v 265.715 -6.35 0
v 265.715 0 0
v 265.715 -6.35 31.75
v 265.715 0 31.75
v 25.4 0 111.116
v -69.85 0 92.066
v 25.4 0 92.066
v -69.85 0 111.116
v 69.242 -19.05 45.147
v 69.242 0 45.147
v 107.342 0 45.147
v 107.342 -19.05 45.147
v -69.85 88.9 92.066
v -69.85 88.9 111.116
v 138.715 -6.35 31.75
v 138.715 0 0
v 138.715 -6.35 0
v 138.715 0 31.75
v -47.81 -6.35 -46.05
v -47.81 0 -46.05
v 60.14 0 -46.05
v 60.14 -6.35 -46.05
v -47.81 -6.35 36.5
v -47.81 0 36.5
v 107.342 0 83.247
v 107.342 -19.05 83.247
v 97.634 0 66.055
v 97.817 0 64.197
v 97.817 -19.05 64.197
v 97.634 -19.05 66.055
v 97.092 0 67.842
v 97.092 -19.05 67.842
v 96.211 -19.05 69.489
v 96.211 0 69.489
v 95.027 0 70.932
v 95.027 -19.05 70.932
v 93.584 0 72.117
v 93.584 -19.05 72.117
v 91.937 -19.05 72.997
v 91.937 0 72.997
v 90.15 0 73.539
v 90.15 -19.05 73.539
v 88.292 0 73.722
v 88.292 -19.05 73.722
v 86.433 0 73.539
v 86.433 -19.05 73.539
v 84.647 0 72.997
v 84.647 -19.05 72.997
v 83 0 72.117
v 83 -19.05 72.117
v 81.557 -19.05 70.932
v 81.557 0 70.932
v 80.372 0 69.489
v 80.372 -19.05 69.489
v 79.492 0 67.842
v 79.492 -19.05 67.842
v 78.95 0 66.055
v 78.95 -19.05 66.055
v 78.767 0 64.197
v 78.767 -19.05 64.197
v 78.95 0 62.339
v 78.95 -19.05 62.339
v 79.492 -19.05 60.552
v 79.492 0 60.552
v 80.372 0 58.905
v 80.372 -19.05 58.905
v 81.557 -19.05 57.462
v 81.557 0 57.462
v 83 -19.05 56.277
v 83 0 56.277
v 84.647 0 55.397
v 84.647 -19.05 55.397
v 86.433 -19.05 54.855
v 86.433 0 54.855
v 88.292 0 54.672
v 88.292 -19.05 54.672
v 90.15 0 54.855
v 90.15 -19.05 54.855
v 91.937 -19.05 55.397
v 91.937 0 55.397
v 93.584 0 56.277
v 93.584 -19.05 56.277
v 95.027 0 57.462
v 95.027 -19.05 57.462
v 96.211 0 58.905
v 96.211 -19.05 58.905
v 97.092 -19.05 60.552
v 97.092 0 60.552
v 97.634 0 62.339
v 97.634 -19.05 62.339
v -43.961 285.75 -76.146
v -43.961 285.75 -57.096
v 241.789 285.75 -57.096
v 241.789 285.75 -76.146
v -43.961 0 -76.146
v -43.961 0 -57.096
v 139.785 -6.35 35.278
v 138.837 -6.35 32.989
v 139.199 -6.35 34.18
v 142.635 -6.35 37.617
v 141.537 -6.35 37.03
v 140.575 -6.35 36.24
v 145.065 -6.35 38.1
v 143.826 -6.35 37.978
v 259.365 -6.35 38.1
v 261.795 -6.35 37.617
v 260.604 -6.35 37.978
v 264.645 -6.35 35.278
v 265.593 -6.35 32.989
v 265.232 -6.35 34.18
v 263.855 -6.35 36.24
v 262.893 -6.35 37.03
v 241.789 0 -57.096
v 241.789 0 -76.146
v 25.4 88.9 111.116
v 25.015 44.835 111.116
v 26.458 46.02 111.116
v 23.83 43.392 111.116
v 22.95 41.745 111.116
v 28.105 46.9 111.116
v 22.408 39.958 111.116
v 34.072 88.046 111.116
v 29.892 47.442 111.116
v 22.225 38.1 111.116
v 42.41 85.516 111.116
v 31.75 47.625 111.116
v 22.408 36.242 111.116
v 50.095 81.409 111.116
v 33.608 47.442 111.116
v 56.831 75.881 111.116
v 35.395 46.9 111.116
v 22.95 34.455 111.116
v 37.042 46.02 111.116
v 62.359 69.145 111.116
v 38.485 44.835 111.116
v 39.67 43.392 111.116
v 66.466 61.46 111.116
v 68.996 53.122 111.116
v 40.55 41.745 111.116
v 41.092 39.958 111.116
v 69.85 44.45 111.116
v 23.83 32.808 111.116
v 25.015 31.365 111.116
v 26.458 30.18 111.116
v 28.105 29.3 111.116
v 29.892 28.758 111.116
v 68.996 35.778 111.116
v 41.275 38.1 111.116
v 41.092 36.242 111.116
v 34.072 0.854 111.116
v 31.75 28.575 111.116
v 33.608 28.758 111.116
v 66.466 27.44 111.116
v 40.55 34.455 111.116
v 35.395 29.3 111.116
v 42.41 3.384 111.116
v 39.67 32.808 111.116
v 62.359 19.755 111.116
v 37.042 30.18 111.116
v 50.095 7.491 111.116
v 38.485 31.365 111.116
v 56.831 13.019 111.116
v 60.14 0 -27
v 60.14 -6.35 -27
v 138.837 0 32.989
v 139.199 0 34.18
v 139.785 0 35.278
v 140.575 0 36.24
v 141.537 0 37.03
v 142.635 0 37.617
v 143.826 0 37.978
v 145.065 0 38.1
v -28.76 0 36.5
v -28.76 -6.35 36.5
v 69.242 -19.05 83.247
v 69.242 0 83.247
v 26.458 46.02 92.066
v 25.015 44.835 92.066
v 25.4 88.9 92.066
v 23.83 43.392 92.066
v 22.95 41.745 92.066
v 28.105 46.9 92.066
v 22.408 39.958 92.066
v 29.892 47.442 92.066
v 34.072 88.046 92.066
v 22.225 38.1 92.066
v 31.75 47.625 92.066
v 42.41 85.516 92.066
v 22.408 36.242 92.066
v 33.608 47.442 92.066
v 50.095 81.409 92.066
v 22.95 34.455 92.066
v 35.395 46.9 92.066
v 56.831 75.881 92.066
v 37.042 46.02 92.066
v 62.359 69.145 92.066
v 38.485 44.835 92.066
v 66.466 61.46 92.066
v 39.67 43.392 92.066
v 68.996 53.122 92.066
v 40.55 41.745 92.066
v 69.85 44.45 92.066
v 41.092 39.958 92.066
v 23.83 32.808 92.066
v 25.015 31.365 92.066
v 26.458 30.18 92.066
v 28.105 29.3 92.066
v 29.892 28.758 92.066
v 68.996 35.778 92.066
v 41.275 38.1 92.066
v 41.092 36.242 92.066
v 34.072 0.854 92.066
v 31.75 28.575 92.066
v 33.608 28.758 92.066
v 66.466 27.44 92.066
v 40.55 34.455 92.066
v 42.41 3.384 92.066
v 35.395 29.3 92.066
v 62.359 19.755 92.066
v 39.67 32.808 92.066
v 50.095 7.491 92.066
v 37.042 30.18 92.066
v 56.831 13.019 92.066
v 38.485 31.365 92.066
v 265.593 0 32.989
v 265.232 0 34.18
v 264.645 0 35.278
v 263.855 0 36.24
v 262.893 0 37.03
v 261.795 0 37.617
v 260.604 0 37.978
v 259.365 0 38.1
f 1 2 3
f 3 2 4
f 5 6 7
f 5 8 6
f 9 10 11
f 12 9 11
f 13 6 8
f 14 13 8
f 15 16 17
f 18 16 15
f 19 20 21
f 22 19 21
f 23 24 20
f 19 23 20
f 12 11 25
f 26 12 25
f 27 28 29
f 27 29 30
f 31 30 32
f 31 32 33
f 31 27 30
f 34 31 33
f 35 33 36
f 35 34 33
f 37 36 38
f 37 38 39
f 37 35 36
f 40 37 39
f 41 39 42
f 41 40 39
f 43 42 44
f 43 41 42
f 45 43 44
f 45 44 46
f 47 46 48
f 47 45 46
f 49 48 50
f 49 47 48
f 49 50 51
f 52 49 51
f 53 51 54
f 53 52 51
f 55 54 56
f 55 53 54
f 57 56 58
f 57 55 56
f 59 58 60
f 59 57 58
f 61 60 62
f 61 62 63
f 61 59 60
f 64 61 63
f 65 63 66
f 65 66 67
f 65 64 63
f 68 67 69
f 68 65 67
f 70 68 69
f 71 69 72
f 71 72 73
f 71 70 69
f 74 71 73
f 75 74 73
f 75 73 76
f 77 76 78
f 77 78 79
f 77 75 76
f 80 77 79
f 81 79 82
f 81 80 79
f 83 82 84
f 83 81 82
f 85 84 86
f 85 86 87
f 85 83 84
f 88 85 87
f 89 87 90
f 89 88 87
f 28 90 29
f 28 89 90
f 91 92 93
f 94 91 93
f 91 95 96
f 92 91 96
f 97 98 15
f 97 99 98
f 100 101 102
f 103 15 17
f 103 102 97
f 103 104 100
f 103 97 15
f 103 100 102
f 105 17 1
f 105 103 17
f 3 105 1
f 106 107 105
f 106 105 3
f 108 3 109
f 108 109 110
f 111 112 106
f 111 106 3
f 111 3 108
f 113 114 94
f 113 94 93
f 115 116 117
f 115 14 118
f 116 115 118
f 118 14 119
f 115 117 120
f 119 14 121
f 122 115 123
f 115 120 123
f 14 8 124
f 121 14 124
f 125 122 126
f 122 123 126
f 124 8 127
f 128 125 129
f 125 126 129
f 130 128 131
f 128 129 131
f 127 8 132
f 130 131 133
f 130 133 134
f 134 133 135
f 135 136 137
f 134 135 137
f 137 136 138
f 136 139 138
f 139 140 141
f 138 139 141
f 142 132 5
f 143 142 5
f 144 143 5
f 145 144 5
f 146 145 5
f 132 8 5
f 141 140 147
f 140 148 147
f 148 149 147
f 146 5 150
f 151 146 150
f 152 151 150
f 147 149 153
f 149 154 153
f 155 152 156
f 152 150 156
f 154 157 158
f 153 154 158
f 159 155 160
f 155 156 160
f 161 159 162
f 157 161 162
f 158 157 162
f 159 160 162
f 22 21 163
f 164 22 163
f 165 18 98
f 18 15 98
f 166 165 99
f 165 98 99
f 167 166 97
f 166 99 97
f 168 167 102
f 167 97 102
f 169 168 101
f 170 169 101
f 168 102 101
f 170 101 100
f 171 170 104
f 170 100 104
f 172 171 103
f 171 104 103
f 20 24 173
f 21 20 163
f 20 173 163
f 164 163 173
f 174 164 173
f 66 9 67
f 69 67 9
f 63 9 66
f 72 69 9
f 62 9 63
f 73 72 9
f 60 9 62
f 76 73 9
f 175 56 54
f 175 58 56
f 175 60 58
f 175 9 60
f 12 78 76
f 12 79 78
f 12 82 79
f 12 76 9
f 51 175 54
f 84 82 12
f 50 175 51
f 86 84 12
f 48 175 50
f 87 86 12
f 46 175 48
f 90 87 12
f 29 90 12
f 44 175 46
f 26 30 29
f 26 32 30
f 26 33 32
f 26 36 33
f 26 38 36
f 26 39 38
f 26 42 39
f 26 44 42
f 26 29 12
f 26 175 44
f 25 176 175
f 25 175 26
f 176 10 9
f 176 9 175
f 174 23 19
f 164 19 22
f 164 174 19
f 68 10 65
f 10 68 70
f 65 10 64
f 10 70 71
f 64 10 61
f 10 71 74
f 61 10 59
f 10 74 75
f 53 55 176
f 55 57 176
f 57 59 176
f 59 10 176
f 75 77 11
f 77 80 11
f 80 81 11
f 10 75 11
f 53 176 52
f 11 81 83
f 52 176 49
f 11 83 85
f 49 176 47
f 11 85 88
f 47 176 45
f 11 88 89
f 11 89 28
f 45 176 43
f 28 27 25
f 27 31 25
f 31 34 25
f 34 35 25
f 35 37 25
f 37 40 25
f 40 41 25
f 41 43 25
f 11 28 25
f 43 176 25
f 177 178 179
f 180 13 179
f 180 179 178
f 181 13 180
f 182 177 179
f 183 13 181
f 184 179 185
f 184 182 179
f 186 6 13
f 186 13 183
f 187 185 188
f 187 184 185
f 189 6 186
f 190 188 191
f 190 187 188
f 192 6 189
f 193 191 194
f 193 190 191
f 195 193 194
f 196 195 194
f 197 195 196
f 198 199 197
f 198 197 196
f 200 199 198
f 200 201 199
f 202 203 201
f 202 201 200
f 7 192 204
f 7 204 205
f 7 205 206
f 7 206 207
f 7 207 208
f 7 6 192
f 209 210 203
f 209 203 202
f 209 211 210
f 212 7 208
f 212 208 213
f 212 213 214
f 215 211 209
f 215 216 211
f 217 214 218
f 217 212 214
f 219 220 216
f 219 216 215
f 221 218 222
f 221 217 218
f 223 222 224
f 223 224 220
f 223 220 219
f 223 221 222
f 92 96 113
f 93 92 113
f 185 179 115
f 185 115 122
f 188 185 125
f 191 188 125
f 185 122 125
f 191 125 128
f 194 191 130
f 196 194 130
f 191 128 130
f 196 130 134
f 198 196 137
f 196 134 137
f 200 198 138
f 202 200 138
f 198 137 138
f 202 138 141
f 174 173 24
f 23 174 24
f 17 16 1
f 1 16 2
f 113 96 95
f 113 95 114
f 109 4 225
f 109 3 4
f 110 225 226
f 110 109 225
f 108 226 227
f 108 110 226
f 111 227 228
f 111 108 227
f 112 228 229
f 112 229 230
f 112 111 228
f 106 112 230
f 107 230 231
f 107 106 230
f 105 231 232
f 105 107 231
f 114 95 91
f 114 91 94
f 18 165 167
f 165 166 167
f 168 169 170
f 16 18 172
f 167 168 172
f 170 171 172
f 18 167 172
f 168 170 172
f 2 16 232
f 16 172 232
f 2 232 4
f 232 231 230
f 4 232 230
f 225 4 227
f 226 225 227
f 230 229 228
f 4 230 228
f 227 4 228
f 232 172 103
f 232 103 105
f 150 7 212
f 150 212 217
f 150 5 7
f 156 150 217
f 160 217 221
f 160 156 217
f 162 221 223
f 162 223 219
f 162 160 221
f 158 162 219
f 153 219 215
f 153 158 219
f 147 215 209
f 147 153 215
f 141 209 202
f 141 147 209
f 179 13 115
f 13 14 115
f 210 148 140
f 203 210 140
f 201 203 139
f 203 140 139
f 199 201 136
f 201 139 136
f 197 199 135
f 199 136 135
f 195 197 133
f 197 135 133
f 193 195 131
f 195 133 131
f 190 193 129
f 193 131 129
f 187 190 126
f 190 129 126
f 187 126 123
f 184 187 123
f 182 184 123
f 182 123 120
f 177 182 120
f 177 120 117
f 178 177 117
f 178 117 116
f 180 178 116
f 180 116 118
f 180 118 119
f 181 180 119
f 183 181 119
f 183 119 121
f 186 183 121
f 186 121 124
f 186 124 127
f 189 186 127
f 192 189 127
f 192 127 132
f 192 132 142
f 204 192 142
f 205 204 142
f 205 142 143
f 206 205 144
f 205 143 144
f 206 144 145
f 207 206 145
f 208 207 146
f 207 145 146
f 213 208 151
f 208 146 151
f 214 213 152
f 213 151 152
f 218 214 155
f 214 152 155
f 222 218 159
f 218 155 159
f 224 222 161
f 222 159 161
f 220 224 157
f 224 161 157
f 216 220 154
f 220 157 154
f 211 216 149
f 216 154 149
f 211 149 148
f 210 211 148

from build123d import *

# Parameters (mm, degrees)
F1_DEPTH  = 6.35
F0_W      = 127
F0_H      = 38.1
F2_R      = 6.35
F3_W      = 285.75
F3_H      = 19.05
F4_DEPTH  = 285.75
F5_W      = 38.1
F5_H      = 38.1
F5_R      = 9.525
F6_DEPTH  = 19.05
F7_W      = 139.7
F7_H      = 19.05
F8_DEPTH  = 88.9
F9_R      = 9.525
F10_DEPTH = 50.8
F11_R     = 44.44999


# Not quite as in the source:
# - a fillet or chamfer is up to 0.001 mm smaller than in the source, because OpenCascade refuses the exact size


with BuildPart() as f1:
    # F0 (on Front) → F1 (new body)
    with BuildSketch(Plane.XZ):
        Polygon((-28.7604803375, 36.4999751758), (-47.8104803375, 36.4999751758), (-47.8104803375, -46.0500248242), (60.1395196625, -46.0500248242), (60.1395196625, -27.0000248242), align=None)
    extrude(amount=F1_DEPTH)


with BuildPart() as f1b:
    # F0 (on Front) → F1, piece 2 (new body)
    with BuildSketch(Plane.XZ):
        with Locations((202.2152820826, 19.05)):
            Rectangle(F0_W, F0_H)
    extrude(amount=F1_DEPTH)

    # F2
    f2_edges = [f1b.edges().sort_by_distance(p)[0] for p in [
        (138.715282, -3.175, 38.1),
        (265.715282, -3.175, 38.1),
    ]]
    fillet(f2_edges, radius=F2_R)


with BuildPart() as f4:
    # F3 (on Front) → F4 (new body)
    with BuildSketch(Plane.XZ):
        with Locations((98.9142842591, -66.6212261169)):
            Rectangle(F3_W, F3_H)
    extrude(amount=-F4_DEPTH)


with BuildPart() as f6:
    # F5 (on Front) → F6 (new body)
    with BuildSketch(Plane.XZ):
        with Locations((88.29173321, 64.1970857978)):
            Rectangle(F5_W, F5_H)
        with Locations((88.29173321, 64.1970857978)):
            Circle(F5_R, mode=Mode.SUBTRACT)
    extrude(amount=F6_DEPTH)


with BuildPart() as f8:
    # F7 (on Front) → F8 (new body)
    with BuildSketch(Plane.XZ):
        with Locations((0, 101.5910909008)):
            Rectangle(F7_W, F7_H)
    extrude(amount=-F8_DEPTH)

    # F9 (on face) → F10 (cut)
    with BuildSketch(Plane.XY.offset(111.1160909008)):
        with Locations((31.75, 38.1)):
            Circle(F9_R)
    extrude(amount=-F10_DEPTH, mode=Mode.SUBTRACT)

    # F11 (radius 44.45 in the source; OpenCascade refuses exactly that, so slightly less here)
    f11_edges = [f8.edges().sort_by_distance(p)[0] for p in [
        (69.85, 0, 101.591091),
        (69.85, 88.9, 101.591091),
    ]]
    fillet(f11_edges, radius=F11_R)


solid = Compound([f1.part, f1b.part, f4.part, f6.part, f8.part])
